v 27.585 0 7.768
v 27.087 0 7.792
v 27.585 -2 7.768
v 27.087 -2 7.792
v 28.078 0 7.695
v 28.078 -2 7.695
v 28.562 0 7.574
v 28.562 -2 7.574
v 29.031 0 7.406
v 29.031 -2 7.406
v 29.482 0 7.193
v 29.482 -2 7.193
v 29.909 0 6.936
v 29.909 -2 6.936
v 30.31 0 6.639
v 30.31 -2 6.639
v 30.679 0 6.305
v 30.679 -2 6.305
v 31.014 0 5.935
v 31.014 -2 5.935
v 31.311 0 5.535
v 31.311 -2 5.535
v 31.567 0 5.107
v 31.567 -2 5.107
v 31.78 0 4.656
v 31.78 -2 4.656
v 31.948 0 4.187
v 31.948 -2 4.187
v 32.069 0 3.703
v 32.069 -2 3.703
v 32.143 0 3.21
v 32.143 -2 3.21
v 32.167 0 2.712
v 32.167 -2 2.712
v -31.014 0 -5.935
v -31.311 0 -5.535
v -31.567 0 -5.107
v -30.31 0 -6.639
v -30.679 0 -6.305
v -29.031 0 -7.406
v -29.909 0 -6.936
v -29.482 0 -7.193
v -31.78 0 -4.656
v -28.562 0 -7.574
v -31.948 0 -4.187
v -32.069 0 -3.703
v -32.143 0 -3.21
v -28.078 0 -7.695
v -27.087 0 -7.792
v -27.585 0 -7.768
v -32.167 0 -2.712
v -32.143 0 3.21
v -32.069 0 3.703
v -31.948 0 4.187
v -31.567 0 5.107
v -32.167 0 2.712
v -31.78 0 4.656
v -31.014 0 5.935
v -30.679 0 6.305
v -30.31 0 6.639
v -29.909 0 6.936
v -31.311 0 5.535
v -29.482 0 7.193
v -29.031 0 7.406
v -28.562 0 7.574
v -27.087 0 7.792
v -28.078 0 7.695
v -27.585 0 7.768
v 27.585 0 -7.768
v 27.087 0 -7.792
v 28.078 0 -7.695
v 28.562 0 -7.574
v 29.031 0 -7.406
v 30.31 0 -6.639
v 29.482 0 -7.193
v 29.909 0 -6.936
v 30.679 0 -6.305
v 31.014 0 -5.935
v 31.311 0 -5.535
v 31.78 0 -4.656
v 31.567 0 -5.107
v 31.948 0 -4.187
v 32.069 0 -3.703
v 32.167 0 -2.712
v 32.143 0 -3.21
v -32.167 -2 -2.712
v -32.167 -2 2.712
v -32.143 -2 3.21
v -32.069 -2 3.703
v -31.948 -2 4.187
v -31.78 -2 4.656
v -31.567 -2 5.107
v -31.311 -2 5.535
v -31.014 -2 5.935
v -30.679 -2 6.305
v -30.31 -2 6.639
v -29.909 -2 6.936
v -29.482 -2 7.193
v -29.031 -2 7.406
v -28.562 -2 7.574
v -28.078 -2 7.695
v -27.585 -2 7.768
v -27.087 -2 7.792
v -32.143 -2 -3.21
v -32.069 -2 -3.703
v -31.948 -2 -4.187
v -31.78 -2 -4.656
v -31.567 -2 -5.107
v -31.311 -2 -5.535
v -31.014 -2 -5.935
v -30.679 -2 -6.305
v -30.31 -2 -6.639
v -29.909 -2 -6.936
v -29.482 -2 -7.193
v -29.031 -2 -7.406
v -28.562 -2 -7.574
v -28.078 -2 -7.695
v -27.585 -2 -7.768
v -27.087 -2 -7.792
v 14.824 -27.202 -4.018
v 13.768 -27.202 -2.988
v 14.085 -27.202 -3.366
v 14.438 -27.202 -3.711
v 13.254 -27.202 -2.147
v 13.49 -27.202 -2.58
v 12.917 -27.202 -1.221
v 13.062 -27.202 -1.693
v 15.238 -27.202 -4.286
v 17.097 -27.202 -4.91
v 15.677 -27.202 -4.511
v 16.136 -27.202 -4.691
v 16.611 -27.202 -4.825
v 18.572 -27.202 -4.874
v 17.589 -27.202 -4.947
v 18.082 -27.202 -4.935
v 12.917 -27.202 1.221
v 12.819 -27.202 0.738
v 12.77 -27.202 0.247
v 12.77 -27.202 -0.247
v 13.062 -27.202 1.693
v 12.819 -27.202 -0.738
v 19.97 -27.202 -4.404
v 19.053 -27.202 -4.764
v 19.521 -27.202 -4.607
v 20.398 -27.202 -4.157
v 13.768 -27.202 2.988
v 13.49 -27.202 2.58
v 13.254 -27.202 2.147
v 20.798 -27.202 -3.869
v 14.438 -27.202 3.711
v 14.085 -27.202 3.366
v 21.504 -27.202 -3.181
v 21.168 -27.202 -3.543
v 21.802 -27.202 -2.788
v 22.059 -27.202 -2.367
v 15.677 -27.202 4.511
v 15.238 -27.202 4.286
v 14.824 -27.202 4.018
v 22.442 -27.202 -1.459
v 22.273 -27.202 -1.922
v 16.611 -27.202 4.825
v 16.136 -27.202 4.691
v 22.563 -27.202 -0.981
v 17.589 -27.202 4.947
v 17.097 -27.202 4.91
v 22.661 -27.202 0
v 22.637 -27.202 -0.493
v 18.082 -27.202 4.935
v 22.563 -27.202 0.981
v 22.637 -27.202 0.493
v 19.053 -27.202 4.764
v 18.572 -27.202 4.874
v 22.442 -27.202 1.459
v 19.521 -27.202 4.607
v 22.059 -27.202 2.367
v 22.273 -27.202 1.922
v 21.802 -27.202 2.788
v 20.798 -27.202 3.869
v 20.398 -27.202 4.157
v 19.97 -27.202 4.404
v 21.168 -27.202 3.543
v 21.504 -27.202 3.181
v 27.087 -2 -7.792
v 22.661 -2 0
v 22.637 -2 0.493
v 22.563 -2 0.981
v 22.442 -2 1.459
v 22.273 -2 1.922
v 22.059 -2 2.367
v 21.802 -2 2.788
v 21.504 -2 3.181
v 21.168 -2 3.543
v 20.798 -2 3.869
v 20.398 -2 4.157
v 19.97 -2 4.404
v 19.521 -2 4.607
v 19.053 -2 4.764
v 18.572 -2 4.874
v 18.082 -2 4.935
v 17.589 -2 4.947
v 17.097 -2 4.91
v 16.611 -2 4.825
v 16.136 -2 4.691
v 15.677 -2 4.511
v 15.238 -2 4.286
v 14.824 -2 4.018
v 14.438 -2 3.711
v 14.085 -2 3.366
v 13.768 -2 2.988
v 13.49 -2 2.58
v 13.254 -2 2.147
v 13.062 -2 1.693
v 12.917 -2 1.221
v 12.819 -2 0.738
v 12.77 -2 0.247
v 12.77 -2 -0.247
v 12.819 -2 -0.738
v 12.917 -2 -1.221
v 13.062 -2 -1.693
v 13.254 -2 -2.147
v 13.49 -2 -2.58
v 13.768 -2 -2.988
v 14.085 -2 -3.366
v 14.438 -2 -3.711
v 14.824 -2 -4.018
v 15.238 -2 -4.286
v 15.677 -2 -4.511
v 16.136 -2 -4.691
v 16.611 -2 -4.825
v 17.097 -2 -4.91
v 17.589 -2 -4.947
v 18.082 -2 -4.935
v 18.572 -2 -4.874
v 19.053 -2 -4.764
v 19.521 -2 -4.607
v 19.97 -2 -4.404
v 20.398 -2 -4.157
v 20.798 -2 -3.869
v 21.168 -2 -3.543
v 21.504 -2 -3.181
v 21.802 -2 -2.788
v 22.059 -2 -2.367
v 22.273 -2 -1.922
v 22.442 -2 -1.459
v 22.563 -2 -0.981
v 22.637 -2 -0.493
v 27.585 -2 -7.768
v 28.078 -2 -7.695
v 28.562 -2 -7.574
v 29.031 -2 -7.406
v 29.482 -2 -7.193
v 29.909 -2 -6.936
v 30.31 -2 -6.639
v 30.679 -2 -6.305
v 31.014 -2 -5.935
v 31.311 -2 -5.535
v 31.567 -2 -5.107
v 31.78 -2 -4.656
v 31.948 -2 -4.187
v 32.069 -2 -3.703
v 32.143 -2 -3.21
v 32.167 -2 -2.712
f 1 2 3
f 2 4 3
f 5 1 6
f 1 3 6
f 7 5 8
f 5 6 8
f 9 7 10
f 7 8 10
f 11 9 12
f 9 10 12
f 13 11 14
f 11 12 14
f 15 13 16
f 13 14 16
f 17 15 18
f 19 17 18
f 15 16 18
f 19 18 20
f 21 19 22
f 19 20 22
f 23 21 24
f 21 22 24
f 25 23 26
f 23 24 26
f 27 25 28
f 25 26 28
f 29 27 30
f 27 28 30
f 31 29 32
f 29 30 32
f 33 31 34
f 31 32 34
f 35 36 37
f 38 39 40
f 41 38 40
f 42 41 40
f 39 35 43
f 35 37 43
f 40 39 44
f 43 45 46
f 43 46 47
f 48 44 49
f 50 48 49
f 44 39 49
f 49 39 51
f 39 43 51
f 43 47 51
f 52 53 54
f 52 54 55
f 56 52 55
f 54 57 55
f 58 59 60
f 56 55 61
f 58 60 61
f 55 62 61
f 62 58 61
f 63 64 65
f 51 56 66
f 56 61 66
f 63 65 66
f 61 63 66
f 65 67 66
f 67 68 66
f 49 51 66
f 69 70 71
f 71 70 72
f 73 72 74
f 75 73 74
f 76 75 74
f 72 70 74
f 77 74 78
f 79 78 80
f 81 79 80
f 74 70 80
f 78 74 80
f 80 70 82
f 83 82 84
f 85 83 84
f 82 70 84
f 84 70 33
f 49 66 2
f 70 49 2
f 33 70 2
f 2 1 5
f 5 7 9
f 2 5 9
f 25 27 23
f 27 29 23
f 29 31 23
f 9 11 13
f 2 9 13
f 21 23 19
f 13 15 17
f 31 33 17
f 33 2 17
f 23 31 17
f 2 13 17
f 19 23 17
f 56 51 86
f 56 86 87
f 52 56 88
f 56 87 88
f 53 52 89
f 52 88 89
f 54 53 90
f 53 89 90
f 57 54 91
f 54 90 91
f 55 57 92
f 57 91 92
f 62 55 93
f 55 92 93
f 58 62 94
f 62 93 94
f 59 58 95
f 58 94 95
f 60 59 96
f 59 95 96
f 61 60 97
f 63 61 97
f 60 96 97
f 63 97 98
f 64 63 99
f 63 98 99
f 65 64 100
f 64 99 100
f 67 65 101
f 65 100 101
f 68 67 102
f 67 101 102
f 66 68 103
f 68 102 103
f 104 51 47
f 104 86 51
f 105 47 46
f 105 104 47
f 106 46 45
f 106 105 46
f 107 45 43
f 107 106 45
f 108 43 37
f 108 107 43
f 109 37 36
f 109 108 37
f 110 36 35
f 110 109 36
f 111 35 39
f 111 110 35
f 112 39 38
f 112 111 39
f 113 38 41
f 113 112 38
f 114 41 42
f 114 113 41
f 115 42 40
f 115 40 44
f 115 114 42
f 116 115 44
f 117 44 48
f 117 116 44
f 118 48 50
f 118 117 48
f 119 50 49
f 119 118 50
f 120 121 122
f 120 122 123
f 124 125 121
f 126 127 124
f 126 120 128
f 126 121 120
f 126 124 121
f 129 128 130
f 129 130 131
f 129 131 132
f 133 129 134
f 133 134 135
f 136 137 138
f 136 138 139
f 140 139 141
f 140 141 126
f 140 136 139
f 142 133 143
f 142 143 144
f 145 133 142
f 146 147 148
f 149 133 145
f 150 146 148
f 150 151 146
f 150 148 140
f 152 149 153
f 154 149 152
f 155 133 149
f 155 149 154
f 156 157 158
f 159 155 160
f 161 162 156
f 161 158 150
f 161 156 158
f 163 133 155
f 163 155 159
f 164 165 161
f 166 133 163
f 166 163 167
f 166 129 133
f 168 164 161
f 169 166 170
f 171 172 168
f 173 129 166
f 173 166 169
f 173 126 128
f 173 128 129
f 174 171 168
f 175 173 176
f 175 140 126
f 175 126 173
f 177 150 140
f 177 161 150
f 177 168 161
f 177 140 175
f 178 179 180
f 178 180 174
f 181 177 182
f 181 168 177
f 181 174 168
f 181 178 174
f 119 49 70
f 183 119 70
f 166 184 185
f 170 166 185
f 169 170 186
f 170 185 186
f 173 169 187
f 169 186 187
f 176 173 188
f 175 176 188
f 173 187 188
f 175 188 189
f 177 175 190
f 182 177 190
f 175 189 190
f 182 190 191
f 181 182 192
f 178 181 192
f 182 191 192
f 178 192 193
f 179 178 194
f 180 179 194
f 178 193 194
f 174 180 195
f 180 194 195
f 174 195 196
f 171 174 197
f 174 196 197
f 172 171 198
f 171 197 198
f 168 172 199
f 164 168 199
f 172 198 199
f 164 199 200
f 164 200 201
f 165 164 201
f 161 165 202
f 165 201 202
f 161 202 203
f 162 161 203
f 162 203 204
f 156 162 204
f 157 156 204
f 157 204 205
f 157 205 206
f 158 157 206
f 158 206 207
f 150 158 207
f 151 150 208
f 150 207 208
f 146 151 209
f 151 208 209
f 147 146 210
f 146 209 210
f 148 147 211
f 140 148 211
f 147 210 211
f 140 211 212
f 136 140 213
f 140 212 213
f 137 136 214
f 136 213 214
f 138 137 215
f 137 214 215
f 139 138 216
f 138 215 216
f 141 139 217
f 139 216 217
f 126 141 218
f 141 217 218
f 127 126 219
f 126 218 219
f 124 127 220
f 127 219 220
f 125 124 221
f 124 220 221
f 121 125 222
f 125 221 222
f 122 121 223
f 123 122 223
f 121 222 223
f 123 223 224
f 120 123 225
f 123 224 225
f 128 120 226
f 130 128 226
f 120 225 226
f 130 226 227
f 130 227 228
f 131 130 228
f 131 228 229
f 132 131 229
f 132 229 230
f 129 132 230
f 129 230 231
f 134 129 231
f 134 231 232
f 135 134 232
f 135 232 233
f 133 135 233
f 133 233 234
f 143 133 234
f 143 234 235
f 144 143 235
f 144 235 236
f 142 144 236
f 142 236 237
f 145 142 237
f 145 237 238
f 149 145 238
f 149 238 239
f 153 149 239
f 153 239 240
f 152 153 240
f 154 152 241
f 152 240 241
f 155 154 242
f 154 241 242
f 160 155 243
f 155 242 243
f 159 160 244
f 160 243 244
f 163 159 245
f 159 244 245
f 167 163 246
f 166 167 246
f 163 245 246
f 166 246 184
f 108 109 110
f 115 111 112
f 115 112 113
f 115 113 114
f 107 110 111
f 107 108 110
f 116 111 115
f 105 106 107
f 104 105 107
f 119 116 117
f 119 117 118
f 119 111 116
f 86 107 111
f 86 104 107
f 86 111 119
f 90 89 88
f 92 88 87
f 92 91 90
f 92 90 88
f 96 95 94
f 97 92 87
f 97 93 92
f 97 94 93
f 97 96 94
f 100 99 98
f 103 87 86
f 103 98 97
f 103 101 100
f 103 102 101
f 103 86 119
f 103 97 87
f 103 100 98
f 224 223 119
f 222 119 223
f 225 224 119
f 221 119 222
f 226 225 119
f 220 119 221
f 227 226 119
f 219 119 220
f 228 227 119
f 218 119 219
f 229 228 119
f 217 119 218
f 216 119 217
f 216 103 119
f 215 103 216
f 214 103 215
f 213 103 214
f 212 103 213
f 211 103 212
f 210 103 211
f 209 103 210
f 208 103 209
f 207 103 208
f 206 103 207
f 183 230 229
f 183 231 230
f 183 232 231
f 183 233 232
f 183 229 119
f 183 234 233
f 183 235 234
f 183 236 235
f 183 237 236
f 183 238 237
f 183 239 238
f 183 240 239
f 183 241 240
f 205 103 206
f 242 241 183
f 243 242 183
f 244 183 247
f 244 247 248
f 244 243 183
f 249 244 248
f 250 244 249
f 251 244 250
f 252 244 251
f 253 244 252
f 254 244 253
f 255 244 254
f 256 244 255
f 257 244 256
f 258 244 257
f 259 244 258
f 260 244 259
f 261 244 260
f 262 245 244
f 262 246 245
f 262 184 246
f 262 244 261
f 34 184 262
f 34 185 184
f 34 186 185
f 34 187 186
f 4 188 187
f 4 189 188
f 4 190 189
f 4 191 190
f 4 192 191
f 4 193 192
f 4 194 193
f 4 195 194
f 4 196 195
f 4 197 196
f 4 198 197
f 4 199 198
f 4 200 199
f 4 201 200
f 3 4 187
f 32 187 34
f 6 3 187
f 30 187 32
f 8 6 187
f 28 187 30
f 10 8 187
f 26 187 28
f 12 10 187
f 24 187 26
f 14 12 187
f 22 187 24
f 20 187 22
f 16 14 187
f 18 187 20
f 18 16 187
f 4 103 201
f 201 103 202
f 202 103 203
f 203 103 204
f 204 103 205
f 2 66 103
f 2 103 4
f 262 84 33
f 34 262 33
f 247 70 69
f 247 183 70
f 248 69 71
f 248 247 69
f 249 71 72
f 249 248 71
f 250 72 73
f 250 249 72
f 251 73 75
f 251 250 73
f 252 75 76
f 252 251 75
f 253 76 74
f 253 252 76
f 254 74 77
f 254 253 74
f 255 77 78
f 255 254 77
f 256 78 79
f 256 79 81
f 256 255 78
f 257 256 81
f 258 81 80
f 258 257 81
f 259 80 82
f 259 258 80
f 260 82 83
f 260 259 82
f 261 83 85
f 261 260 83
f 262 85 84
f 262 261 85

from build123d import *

# Parameters (mm, degrees)
F0_W     = 64.334008
F0_H     = 15.584806
F1_DEPTH = 2
F2_R     = 4.948824
F3_DEPTH = 25.2024
F4_R     = 5.08


with BuildPart() as f1:
    # F0 (on Front) → F1 (new body)
    with BuildSketch(Plane.XZ):
        Rectangle(F0_W, F0_H)
    extrude(amount=F1_DEPTH)

    # F2 (on face) → F3 (join)
    with BuildSketch(Plane.XZ.offset(2)):
        with Locations((17.712619, 0)):
            Circle(F2_R)
    extrude(amount=F3_DEPTH)

    # F4
    f4_edges = [f1.edges().sort_by_distance(p)[0] for p in [
        (-32.167004, -1, -7.792403),
        (-32.167004, -1, 7.792403),
        (32.167004, -1, -7.792403),
        (32.167004, -1, 7.792403),
    ]]
    fillet(f4_edges, radius=F4_R)


solid = f1.part
